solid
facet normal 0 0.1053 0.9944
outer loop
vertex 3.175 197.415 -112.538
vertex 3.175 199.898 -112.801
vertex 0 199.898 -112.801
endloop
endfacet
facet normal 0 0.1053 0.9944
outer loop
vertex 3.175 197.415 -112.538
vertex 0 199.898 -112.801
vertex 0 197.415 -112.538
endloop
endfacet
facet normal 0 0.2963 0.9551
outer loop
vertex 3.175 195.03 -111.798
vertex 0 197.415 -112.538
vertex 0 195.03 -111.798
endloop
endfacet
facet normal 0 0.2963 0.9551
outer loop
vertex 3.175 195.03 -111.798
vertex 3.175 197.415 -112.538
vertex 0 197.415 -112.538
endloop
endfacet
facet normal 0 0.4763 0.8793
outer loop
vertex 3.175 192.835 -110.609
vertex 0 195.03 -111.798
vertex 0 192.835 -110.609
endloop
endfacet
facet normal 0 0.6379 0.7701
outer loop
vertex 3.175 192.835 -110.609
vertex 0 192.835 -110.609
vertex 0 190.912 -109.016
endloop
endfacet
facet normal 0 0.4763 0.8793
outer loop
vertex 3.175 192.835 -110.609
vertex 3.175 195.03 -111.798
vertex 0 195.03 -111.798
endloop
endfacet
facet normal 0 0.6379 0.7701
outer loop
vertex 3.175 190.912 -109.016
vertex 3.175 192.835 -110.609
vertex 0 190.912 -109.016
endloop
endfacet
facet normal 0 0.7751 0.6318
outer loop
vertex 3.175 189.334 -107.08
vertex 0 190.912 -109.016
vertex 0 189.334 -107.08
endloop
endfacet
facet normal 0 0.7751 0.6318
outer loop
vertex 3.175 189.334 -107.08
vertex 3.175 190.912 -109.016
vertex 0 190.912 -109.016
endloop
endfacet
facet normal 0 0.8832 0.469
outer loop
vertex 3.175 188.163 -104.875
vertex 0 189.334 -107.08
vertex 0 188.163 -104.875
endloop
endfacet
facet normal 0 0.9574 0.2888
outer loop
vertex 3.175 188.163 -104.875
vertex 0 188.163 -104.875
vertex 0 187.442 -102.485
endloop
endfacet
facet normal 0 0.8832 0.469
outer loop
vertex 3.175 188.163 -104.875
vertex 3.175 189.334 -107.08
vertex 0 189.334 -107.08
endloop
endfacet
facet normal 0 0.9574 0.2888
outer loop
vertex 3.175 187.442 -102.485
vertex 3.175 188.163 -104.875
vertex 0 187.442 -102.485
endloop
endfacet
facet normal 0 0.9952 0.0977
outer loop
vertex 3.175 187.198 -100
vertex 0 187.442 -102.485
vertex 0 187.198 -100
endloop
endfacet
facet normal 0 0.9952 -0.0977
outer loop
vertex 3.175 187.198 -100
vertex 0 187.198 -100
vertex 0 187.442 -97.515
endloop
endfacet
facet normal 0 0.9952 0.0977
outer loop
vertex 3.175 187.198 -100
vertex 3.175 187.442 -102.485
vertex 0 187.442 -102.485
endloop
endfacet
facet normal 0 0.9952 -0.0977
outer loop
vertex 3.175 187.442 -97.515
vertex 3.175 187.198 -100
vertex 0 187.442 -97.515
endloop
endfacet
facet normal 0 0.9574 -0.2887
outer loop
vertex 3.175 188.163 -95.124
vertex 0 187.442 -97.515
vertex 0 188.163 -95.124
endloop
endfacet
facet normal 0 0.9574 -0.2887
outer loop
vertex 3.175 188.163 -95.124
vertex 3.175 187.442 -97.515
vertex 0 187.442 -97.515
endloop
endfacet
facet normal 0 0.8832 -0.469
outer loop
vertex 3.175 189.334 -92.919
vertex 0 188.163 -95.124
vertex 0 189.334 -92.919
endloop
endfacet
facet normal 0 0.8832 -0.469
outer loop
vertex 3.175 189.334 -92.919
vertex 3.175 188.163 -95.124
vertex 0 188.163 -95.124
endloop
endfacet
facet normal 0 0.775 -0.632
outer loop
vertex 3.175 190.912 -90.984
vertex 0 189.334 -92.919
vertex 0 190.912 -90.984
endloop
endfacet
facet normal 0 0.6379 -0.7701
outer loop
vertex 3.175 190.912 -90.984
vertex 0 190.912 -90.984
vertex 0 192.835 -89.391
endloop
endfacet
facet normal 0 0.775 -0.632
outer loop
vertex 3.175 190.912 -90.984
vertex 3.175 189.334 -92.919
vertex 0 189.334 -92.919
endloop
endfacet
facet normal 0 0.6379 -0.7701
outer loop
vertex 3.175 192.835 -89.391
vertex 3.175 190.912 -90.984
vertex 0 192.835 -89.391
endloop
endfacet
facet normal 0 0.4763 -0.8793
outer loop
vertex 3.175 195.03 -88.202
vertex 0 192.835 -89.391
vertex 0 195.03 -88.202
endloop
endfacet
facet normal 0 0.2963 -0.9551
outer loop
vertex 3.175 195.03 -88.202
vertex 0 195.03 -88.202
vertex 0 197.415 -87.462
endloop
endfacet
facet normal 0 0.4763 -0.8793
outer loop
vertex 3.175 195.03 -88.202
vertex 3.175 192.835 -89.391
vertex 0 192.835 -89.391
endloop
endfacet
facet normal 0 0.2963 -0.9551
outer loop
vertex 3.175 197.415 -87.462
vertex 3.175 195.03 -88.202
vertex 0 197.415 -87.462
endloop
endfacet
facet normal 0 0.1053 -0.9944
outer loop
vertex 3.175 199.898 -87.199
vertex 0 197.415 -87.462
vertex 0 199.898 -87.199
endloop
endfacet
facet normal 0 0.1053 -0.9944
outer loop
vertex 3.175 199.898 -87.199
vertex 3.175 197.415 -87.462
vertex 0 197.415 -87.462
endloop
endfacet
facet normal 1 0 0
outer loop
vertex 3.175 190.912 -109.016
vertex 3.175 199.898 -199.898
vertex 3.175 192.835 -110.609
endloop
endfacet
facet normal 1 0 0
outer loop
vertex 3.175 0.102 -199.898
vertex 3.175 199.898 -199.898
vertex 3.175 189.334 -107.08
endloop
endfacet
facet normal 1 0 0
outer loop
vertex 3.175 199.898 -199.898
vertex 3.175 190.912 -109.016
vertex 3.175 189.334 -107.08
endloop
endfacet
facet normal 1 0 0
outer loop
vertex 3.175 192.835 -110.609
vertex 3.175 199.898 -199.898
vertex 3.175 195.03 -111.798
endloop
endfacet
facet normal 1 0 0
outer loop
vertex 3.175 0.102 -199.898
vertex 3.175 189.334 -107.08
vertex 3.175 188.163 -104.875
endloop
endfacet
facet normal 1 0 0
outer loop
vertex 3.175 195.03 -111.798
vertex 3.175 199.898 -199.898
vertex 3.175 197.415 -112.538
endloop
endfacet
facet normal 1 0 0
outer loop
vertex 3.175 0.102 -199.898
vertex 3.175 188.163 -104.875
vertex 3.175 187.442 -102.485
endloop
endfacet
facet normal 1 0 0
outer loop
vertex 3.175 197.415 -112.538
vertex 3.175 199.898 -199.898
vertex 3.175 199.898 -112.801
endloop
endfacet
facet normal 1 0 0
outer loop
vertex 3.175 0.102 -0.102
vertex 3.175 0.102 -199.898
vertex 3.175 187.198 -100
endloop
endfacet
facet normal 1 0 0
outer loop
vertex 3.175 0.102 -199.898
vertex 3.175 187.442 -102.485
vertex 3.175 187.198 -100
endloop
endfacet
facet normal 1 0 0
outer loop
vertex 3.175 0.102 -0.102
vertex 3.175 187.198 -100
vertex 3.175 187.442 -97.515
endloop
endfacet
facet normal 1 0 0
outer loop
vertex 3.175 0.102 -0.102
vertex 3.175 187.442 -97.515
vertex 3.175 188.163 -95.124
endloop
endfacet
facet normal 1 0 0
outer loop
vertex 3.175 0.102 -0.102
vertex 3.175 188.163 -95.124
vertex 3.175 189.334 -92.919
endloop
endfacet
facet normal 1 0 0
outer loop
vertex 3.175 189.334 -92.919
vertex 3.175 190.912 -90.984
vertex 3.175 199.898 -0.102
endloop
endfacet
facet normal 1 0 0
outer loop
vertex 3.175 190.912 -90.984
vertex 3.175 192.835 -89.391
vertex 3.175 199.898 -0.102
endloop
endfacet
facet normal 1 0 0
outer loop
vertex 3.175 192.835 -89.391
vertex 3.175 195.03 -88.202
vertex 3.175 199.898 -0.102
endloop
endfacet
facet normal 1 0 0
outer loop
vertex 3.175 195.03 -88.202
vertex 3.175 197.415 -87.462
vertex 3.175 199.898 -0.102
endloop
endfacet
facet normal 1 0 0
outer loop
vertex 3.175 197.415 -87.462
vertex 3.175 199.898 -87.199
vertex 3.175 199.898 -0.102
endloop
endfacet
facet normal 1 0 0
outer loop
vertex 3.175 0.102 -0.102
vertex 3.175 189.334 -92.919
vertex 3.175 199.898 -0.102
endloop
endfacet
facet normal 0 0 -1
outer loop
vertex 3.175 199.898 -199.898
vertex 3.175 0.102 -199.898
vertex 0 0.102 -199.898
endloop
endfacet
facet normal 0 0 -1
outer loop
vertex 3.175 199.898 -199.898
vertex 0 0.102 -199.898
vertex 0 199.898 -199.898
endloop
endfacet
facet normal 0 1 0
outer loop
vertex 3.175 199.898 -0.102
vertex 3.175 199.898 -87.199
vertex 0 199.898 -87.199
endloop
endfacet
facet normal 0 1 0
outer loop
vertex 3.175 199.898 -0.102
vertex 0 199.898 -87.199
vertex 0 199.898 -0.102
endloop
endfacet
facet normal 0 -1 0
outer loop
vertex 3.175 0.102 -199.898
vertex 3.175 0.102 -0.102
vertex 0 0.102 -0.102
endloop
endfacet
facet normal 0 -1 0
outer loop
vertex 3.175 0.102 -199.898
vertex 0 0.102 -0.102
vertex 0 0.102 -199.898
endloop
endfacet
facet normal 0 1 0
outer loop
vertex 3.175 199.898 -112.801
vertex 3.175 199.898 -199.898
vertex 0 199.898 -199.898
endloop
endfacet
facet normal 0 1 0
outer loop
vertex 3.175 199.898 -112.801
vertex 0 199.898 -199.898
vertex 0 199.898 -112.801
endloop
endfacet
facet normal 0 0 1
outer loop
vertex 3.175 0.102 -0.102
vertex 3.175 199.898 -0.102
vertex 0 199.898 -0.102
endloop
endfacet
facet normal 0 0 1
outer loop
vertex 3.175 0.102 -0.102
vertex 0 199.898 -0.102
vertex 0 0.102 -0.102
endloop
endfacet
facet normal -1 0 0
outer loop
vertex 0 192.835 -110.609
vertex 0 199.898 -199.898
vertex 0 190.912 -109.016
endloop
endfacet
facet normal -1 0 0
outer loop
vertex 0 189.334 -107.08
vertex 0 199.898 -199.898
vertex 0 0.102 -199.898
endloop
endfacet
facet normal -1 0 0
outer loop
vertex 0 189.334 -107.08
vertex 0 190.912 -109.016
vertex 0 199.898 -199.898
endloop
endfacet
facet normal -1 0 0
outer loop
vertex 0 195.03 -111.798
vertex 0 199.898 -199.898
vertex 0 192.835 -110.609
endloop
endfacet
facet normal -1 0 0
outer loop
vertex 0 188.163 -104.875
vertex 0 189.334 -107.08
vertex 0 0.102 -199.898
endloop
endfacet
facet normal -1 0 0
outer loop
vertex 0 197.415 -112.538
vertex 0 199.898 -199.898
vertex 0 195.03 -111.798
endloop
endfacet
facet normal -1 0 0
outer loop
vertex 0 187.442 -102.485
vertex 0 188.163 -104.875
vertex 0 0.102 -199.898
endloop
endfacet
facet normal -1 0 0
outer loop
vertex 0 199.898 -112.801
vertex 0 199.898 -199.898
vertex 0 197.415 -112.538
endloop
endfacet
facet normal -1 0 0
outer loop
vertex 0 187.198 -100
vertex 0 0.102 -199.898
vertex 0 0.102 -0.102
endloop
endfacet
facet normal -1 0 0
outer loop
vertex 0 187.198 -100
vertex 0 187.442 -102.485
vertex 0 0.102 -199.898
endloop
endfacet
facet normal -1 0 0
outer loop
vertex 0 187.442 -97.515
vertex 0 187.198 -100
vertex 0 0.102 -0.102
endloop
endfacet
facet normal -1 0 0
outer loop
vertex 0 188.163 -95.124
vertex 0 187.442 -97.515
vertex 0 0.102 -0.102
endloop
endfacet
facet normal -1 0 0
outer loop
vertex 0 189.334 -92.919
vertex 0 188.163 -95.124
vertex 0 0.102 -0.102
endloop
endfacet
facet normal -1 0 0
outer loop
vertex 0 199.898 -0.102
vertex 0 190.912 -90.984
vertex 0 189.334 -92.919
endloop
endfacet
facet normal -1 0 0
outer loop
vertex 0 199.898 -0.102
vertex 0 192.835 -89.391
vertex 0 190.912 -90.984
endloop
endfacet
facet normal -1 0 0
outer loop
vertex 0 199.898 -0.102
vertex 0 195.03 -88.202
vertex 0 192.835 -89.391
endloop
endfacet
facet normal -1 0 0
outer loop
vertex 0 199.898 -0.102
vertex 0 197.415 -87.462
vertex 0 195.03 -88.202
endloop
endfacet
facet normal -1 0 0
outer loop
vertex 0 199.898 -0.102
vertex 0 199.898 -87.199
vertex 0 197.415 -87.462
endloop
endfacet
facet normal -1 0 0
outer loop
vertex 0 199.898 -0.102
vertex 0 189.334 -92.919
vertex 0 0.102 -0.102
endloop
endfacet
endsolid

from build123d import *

# Parameters (mm, degrees)
BOSS_EXTRUDE1_DEPTH = 3.175
CUT_EXTRUDE1_DEPTH  = 3.175


with BuildPart() as part:
    # Sketch1 → Boss-Extrude1 (new body)
    with BuildSketch(Plane(origin=(0, 0, 0), x_dir=(0, 0, -1), z_dir=(1, 0, 0))):
        with BuildLine():
            Line((0, 199.9996), (87.2998, 199.9996))
            ThreePointArc((87.2998, 199.9996), (99.9998, 187.2996), (112.6998, 199.9996))
            Line((112.6998, 199.9996), (199.9996, 199.9996))
            Line((199.9996, 199.9996), (199.9996, 0))
            Line((199.9996, 0), (0, 0))
            Line((0, 0), (0, 199.9996))
        make_face()
    extrude(amount=BOSS_EXTRUDE1_DEPTH)

    # Sketch2 → Cut-Extrude1 (cut)
    with BuildSketch(Plane(origin=(3.175, 0, 0), x_dir=(0, 0, -1), z_dir=(1, 0, 0))):
        with BuildLine():
            Line((199.9996, 199.9996), (112.6998, 199.9996))
            ThreePointArc((112.6998, 199.9996), (99.9998, 187.2996), (87.2998, 199.9996))
            Line((87.2998, 199.9996), (0, 199.9996))
            Line((0, 199.9996), (0, 0))
            Line((0, 0), (199.9996, 0))
            Line((199.9996, 0), (199.9996, 199.9996))
        make_face()
        with BuildLine():
            Line((199.898, 199.898), (112.800996819, 199.898))
            ThreePointArc((112.800996819, 199.898), (99.9998, 187.198), (87.198603181, 199.898))
            Line((87.198603181, 199.898), (0.1016, 199.898))
            Line((0.1016, 199.898), (0.1016, 0.1016))
            Line((0.1016, 0.1016), (199.898, 0.1016))
            Line((199.898, 0.1016), (199.898, 199.898))
        make_face(mode=Mode.SUBTRACT)
    extrude(amount=-CUT_EXTRUDE1_DEPTH, mode=Mode.SUBTRACT)


solid = part.part
